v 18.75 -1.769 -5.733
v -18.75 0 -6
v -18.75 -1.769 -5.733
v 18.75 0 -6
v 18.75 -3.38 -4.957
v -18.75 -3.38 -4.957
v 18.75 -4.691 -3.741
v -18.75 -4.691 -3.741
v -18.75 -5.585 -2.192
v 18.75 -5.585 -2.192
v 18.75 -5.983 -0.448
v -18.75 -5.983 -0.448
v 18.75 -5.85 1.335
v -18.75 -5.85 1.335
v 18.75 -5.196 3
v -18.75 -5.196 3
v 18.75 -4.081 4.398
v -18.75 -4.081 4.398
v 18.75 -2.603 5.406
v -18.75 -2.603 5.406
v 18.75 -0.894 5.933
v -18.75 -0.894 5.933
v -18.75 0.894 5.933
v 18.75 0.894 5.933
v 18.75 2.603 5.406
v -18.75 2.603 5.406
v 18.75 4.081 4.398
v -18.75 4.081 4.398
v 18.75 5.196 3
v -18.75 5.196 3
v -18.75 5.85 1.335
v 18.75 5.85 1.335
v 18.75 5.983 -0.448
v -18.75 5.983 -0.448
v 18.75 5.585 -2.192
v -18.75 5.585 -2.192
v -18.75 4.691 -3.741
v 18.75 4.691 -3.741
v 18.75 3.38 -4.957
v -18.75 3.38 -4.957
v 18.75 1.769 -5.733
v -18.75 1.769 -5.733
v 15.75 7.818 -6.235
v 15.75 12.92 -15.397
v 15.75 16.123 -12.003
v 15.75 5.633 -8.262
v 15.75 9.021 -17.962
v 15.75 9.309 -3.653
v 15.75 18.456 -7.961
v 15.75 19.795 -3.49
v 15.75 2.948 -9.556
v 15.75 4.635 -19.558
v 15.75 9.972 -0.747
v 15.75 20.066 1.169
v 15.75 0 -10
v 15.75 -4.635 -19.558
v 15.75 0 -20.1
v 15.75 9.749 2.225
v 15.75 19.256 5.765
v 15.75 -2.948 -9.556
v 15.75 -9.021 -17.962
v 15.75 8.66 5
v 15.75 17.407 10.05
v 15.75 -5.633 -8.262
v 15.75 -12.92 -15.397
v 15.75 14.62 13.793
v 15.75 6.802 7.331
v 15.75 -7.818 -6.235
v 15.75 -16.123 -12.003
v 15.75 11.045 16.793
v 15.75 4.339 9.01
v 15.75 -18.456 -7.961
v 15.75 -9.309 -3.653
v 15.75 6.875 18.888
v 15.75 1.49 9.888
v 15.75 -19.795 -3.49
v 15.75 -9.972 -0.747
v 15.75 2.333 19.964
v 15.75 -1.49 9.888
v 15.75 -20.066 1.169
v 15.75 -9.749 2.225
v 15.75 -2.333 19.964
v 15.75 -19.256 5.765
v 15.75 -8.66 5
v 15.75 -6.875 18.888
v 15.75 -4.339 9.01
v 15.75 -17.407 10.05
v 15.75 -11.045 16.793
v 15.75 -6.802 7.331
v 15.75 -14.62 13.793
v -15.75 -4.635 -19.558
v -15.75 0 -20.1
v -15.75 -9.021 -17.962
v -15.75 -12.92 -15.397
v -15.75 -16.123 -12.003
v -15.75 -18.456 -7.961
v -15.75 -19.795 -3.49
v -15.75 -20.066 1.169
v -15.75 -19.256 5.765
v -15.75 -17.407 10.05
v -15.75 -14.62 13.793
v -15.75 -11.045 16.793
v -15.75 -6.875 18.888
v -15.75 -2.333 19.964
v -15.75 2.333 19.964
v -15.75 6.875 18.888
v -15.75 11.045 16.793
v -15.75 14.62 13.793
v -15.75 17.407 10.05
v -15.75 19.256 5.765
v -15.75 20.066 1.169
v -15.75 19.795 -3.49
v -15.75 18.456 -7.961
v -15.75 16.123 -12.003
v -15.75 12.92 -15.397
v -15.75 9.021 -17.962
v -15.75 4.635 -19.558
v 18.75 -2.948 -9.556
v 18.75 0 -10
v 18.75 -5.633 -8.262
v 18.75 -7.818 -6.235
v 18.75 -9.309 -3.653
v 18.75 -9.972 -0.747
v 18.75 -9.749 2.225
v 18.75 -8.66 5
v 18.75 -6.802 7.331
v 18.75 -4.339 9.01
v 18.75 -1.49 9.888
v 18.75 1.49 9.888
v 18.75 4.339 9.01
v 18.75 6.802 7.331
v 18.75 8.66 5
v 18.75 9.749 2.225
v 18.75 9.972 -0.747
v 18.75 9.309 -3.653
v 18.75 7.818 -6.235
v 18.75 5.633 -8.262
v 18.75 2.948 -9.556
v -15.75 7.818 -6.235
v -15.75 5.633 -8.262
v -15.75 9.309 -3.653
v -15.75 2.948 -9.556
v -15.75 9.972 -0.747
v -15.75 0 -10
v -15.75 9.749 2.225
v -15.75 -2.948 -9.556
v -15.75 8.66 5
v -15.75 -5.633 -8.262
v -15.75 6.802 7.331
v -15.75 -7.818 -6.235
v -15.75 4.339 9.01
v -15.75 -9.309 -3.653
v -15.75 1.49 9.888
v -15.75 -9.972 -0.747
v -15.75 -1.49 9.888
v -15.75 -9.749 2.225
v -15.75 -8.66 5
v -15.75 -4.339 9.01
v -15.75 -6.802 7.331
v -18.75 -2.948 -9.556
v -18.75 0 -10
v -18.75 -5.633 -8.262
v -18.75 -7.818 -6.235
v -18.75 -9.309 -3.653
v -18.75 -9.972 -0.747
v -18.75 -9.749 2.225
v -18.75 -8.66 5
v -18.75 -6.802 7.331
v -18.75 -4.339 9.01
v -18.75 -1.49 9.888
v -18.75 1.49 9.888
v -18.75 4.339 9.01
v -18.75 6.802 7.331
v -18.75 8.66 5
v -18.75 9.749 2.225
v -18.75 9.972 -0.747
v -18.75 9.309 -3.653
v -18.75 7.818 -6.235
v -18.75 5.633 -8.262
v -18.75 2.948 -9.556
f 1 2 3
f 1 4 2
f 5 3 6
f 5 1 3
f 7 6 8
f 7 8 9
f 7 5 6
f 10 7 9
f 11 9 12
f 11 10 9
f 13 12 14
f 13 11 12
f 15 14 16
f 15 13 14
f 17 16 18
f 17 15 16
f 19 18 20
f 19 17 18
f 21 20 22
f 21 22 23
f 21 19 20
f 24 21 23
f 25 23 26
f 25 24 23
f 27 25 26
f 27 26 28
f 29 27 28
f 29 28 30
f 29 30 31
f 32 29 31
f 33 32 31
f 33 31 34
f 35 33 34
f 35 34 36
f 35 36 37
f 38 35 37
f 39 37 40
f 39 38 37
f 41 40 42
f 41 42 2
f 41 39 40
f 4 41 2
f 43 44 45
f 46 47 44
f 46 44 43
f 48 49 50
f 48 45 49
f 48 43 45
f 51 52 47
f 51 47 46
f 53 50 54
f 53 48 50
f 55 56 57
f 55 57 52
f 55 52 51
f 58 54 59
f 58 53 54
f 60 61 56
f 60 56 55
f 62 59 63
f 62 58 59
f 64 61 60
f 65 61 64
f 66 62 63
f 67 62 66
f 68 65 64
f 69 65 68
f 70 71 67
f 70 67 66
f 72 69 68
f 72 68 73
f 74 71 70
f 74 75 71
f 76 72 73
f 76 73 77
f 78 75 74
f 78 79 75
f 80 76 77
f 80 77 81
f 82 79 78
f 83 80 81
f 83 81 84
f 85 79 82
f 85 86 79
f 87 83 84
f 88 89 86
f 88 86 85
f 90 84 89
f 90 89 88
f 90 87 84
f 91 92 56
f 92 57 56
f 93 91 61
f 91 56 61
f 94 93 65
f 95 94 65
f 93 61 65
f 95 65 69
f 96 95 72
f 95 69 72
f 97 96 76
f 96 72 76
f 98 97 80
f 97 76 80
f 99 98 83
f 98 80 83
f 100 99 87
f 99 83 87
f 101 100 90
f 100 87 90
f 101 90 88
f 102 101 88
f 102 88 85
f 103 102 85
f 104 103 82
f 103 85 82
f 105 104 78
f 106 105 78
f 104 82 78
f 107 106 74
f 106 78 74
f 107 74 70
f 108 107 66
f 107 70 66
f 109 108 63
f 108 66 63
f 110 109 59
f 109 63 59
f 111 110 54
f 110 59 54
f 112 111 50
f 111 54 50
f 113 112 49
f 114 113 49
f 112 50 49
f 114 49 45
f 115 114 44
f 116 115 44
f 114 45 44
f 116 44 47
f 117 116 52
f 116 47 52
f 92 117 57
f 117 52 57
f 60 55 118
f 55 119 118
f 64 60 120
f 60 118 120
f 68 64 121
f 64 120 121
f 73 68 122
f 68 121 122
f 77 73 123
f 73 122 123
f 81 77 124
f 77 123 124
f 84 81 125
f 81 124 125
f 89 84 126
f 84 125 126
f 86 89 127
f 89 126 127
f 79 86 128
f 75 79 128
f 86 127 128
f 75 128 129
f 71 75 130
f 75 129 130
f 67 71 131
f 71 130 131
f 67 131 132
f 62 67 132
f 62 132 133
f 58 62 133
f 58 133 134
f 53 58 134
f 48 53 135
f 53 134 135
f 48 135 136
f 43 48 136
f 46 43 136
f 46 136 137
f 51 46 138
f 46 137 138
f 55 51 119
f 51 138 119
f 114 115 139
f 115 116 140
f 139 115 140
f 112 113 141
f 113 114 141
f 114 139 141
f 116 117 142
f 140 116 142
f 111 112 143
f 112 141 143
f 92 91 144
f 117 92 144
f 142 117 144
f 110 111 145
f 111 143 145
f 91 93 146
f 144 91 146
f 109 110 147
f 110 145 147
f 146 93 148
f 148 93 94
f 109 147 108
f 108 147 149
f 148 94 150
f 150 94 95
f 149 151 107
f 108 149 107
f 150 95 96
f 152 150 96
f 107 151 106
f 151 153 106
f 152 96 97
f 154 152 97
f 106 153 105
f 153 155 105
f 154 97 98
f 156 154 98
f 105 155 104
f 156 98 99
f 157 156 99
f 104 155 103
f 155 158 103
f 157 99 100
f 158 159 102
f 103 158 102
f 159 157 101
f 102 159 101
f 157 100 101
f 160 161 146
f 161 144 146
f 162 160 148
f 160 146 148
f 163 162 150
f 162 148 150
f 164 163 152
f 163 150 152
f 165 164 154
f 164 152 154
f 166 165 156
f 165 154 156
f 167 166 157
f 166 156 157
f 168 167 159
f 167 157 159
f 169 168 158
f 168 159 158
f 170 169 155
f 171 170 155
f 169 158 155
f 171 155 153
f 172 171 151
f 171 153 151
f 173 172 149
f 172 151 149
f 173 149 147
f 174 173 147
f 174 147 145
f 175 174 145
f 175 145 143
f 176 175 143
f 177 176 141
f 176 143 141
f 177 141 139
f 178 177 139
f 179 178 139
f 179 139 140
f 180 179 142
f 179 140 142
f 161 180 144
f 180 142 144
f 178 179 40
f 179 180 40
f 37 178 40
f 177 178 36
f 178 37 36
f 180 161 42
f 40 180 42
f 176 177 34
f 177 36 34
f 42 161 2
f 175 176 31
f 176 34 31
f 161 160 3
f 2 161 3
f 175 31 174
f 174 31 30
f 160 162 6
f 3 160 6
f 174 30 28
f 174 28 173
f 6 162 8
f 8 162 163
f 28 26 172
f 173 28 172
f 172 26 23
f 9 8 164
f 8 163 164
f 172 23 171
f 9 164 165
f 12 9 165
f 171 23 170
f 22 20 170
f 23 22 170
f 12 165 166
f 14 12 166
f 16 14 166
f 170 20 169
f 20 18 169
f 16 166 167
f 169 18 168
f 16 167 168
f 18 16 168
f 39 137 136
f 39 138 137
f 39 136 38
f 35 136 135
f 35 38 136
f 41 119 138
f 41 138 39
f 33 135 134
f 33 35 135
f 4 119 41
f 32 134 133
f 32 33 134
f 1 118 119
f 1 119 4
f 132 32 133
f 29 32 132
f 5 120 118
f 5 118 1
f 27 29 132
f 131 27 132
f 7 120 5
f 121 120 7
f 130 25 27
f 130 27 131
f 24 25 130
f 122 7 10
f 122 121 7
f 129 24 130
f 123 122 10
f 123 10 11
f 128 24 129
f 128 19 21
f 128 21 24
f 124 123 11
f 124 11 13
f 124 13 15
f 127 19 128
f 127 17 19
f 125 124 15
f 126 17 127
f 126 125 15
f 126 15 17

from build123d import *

# Parameters (mm, degrees)
SZKIC1_W   = 31.5
SZKIC1_H   = 14.1
SZKIC1_W_2 = 3
SZKIC1_H_2 = 4


with BuildPart() as part:
    # Szkic1 → Obrót1 (revolve)
    with BuildSketch(Plane.XY, mode=Mode.PRIVATE) as obr_t1_sk:
        with Locations((0, 13.05)):
            Rectangle(SZKIC1_W, SZKIC1_H)
        with Locations((-17.25, 8)):
            Rectangle(SZKIC1_W_2, SZKIC1_H_2)
        with Locations((17.25, 8)):
            Rectangle(SZKIC1_W_2, SZKIC1_H_2)
    revolve(obr_t1_sk.sketch.rotate(Axis((0, 0, 0), (-1, 0, 0)), 90), axis=Axis((0, 0, 0), (-1, 0, 0)))


solid = part.part
